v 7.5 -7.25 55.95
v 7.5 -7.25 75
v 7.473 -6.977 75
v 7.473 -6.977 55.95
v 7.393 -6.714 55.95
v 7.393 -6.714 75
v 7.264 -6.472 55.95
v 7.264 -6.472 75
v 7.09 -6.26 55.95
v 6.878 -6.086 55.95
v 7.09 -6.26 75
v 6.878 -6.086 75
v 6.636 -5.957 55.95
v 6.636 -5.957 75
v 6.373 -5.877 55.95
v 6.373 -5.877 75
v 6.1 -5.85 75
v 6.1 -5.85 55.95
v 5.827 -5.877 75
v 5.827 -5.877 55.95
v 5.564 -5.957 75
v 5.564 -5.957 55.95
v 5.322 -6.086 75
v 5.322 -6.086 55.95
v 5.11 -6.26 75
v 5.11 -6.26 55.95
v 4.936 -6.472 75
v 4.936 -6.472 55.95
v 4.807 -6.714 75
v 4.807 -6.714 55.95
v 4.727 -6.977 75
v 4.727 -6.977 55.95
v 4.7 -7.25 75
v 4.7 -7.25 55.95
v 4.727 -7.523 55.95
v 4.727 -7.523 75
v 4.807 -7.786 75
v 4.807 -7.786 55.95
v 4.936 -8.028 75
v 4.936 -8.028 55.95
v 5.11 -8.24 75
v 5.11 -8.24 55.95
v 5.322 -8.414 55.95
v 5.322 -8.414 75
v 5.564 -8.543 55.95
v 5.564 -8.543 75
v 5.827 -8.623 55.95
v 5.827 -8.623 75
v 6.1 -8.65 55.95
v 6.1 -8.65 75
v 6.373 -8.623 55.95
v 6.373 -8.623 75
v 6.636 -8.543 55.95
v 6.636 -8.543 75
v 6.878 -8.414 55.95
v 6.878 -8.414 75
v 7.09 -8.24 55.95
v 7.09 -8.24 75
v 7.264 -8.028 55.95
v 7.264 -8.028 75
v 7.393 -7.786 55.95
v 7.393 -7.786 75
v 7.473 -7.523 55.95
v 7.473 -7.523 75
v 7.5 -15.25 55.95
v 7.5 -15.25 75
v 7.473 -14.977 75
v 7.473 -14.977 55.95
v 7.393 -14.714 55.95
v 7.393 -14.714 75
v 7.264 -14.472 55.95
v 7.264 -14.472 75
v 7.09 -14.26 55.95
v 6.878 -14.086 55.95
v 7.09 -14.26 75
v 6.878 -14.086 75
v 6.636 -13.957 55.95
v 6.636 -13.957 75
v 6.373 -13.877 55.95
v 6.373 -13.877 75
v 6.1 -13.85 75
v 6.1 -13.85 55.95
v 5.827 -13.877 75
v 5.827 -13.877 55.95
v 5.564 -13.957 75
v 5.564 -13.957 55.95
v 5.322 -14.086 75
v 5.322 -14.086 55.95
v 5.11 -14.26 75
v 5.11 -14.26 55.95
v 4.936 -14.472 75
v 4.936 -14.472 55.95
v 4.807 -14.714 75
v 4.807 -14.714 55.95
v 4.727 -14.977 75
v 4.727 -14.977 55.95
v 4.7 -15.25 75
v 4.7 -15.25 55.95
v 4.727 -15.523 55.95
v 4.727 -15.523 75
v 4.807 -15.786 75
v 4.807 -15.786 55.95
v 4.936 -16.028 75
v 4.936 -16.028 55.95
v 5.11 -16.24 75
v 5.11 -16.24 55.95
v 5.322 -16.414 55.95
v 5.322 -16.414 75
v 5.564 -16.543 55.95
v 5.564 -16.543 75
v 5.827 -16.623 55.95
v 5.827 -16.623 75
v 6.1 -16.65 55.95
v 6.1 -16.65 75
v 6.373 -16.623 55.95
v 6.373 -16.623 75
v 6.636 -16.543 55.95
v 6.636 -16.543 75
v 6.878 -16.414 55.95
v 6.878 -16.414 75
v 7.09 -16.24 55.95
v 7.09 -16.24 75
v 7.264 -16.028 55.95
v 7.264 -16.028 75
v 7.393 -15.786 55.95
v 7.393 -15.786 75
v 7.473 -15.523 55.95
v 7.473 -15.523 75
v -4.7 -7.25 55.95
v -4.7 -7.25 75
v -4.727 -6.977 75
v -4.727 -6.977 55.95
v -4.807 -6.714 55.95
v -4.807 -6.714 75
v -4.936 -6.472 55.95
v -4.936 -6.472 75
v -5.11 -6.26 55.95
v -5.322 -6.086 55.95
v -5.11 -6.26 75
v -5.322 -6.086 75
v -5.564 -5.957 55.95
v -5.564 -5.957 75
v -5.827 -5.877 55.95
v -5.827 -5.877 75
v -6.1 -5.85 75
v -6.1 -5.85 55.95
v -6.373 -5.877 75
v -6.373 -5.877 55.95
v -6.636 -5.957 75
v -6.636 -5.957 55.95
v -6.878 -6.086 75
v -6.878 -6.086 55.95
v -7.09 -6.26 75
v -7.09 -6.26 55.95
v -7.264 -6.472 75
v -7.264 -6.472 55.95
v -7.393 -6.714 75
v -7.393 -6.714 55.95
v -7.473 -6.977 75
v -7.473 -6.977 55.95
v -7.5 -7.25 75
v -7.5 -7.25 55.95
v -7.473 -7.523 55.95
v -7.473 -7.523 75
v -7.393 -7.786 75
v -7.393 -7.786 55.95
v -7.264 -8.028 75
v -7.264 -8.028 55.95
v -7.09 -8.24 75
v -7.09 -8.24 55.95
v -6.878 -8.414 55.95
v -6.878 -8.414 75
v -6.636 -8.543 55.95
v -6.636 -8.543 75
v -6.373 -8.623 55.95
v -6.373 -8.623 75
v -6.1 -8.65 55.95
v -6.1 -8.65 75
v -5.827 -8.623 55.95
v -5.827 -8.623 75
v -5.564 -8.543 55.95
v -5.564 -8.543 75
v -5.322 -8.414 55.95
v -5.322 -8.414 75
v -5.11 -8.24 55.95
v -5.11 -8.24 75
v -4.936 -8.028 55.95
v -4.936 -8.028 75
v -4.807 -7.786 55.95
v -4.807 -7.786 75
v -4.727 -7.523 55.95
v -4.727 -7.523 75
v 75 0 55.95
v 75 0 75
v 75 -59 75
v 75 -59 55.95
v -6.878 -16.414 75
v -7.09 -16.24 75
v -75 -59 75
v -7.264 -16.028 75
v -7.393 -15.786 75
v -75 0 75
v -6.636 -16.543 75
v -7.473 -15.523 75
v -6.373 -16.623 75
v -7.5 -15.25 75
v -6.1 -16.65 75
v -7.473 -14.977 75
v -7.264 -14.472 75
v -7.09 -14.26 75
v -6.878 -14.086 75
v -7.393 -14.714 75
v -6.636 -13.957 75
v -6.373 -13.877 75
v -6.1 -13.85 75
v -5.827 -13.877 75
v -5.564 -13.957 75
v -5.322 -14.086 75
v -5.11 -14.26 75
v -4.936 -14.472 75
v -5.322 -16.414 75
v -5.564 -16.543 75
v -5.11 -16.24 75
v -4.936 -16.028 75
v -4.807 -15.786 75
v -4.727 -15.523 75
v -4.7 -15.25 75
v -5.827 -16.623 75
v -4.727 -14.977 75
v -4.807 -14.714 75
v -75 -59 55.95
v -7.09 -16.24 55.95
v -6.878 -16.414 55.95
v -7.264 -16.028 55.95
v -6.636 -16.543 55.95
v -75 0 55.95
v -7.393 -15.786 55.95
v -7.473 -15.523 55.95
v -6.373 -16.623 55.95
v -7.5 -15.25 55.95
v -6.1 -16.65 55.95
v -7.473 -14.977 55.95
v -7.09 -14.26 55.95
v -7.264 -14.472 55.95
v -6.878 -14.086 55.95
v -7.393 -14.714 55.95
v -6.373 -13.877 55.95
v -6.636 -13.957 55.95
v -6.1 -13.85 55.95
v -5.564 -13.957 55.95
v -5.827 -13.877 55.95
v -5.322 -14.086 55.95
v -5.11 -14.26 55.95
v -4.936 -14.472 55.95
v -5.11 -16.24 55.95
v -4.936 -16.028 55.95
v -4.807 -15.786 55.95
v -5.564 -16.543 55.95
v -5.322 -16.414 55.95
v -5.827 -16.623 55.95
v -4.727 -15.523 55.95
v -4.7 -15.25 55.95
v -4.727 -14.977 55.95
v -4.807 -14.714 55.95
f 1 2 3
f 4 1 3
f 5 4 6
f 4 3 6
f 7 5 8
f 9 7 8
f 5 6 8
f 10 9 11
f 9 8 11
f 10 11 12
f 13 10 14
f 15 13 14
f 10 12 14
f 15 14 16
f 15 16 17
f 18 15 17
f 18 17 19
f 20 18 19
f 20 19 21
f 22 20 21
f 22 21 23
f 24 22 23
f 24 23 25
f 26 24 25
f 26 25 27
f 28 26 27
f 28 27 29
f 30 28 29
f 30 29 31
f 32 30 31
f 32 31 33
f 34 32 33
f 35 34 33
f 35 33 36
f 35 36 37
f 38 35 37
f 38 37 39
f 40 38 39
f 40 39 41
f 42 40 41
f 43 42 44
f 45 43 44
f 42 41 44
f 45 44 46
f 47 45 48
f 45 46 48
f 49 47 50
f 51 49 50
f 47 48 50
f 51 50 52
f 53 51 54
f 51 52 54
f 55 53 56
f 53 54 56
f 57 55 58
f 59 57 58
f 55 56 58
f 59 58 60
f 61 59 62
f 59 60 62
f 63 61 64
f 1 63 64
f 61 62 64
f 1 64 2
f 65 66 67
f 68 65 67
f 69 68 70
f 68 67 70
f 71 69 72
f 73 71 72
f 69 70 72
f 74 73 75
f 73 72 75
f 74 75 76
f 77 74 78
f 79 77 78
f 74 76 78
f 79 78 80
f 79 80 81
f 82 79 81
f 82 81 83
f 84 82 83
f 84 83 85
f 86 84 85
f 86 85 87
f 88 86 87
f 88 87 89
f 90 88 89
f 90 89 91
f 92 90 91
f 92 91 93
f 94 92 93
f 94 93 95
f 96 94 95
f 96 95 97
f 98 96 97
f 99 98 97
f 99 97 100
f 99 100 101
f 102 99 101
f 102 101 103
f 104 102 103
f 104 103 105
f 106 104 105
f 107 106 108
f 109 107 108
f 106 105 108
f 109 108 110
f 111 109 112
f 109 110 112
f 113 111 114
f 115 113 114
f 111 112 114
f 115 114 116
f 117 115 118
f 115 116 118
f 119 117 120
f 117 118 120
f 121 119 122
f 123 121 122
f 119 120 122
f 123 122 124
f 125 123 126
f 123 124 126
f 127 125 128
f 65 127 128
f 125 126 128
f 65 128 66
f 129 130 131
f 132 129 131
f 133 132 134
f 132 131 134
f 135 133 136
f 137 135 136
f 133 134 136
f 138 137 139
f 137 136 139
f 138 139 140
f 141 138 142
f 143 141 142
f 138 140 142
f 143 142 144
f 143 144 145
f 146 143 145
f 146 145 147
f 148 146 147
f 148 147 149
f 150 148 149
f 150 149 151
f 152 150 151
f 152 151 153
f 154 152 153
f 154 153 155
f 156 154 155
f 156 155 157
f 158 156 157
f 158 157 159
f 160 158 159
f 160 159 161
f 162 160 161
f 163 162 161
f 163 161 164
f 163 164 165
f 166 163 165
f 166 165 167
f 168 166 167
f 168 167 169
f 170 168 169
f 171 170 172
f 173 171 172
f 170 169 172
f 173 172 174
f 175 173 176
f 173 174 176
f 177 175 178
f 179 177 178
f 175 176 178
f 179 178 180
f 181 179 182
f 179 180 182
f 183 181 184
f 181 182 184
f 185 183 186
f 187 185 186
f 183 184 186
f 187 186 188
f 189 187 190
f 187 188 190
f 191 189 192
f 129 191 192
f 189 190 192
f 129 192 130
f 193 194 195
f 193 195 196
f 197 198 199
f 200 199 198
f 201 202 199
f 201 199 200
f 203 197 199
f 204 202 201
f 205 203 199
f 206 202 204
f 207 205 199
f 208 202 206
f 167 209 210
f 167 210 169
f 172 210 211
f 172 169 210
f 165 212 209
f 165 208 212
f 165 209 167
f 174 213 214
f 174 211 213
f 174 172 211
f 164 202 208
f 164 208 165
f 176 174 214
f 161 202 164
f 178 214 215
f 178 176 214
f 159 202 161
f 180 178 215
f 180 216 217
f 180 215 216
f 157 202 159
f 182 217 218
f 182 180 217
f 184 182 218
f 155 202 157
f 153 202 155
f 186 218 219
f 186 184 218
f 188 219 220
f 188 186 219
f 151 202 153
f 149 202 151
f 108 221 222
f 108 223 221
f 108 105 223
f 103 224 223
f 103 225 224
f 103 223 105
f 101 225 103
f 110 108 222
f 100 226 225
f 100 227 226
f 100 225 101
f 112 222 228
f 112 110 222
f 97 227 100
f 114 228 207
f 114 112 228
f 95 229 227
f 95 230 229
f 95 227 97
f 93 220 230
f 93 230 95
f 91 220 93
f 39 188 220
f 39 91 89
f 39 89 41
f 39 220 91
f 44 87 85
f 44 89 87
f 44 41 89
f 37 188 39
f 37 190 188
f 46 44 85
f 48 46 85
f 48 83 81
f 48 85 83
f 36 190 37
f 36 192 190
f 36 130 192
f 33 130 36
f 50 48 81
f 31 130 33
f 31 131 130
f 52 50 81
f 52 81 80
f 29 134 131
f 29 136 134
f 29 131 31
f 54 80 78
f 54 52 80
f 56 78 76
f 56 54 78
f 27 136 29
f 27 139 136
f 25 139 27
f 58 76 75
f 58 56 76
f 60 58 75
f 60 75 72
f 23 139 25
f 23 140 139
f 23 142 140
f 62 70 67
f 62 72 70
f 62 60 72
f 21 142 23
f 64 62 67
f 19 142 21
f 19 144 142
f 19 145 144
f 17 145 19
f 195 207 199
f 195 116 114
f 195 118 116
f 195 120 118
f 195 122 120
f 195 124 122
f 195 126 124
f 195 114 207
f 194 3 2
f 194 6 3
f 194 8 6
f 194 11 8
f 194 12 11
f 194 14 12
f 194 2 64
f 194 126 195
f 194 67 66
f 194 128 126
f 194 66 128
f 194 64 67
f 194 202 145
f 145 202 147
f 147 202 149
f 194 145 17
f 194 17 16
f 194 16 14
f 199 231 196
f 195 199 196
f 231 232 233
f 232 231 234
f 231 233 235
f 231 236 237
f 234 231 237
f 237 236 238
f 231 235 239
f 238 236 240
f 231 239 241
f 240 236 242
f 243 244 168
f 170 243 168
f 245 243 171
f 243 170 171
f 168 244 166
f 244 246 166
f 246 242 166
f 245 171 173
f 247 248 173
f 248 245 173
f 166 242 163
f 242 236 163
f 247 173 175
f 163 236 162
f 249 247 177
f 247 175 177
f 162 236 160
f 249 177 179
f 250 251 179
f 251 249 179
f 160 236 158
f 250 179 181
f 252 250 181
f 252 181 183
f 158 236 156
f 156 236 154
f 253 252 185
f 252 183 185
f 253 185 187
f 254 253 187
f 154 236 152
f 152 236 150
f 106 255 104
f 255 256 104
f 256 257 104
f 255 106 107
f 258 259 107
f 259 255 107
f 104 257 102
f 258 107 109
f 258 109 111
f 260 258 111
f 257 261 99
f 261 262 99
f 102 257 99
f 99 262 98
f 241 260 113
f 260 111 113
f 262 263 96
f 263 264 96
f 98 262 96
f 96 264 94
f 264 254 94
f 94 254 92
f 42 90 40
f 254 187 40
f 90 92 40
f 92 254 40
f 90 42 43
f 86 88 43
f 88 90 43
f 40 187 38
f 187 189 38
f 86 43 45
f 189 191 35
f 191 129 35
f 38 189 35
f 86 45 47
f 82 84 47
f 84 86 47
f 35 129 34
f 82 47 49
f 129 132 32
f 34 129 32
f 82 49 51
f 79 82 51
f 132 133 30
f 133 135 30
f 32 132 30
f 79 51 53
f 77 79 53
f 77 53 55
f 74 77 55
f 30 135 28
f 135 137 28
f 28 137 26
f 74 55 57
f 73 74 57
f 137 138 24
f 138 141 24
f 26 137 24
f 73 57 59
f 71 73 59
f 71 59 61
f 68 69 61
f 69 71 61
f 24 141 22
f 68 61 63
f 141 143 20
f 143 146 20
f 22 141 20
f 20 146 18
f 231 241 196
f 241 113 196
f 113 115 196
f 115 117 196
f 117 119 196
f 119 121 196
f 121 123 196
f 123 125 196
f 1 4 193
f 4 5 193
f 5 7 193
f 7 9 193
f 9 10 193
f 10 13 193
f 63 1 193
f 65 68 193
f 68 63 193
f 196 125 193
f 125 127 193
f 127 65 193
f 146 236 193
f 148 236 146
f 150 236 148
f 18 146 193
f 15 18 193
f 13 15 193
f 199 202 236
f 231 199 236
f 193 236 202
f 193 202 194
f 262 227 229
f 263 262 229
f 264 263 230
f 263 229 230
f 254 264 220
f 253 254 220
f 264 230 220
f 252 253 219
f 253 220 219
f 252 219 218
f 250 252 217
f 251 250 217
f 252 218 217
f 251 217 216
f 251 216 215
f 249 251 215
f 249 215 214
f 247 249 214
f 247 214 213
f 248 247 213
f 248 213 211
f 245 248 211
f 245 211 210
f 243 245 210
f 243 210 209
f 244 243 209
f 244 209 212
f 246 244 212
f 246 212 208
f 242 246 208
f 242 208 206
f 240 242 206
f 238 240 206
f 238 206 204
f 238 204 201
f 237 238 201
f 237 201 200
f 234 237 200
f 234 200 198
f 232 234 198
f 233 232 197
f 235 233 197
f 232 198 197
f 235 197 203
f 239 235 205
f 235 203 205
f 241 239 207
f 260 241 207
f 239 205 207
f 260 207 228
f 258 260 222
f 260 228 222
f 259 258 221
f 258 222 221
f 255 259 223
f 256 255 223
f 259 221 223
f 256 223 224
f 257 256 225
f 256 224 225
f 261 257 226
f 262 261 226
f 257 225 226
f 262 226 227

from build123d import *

# Parameters (mm, degrees)
SKETCH1_W           = 150
SKETCH1_H           = 150
BOSS_EXTRUDE1_DEPTH = 59
SKETCH2_W           = 111.9
SKETCH2_H           = 111.9
CUT_EXTRUDE1_DEPTH  = 60
SKETCH9_R           = 1.4
CUT_EXTRUDE4_DEPTH  = 20
CIRPATTERN1_COUNT   = 3
CIRPATTERN1_ANGLE   = 180
SKETCH10_W          = 111.9
SKETCH10_H          = 105.448295943
CUT_EXTRUDE6_DEPTH  = 60
SKETCH12_W          = 150
SKETCH12_H          = 130.95
CUT_EXTRUDE7_DEPTH  = 60


with BuildPart() as part:
    # Sketch1 → Boss-Extrude1 (new body)
    with BuildSketch(Plane(origin=(0, 0, 0), x_dir=(1, 0, 0), z_dir=(0, 1, 0))):
        Rectangle(SKETCH1_W, SKETCH1_H)
    extrude(amount=-BOSS_EXTRUDE1_DEPTH)

    # Sketch2 → Cut-Extrude1 (cut, through all)
    with BuildSketch(Plane(origin=(0, 0, 0), x_dir=(1, 0, 0), z_dir=(0, 1, 0))):
        Rectangle(SKETCH2_W, SKETCH2_H)
    extrude(amount=-CUT_EXTRUDE1_DEPTH, mode=Mode.SUBTRACT)

    # Sketch9 → Cut-Extrude4 (cut)
    with BuildSketch(Plane.ZY.offset(75)):
        with Locations((-6.1, -7.25)):
            Circle(SKETCH9_R)
        with Locations((6.1, -7.25)):
            Circle(SKETCH9_R)
        with Locations((6.1, -15.25)):
            Circle(SKETCH9_R)
        with Locations((-6.1, -15.25)):
            Circle(SKETCH9_R)
    cut_extrude4 = extrude(amount=-CUT_EXTRUDE4_DEPTH, mode=Mode.SUBTRACT)

    # CirPattern1: Cut-Extrude4 ×3 about axis
    cirpattern1_axis = Axis((0, 0, 0), (0, 1, 0))
    for i in range(1, CIRPATTERN1_COUNT):
        add(cut_extrude4.rotate(cirpattern1_axis, i * CIRPATTERN1_ANGLE / (CIRPATTERN1_COUNT - 1)), mode=Mode.SUBTRACT)

    # Sketch10 → Cut-Extrude6 (cut, through all)
    with BuildSketch(Plane(origin=(0, 0, 0), x_dir=(1, 0, 0), z_dir=(0, 1, 0))):
        with Locations((0, 108.674147972)):
            Rectangle(SKETCH10_W, SKETCH10_H)
    extrude(amount=-CUT_EXTRUDE6_DEPTH, mode=Mode.SUBTRACT)

    # Sketch12 → Cut-Extrude7 (cut, through all)
    with BuildSketch(Plane(origin=(0, 0, 0), x_dir=(1, 0, 0), z_dir=(0, 1, 0))):
        with Locations((0, 9.525)):
            Rectangle(SKETCH12_W, SKETCH12_H)
    extrude(amount=-CUT_EXTRUDE7_DEPTH, mode=Mode.SUBTRACT)


solid = part.part
